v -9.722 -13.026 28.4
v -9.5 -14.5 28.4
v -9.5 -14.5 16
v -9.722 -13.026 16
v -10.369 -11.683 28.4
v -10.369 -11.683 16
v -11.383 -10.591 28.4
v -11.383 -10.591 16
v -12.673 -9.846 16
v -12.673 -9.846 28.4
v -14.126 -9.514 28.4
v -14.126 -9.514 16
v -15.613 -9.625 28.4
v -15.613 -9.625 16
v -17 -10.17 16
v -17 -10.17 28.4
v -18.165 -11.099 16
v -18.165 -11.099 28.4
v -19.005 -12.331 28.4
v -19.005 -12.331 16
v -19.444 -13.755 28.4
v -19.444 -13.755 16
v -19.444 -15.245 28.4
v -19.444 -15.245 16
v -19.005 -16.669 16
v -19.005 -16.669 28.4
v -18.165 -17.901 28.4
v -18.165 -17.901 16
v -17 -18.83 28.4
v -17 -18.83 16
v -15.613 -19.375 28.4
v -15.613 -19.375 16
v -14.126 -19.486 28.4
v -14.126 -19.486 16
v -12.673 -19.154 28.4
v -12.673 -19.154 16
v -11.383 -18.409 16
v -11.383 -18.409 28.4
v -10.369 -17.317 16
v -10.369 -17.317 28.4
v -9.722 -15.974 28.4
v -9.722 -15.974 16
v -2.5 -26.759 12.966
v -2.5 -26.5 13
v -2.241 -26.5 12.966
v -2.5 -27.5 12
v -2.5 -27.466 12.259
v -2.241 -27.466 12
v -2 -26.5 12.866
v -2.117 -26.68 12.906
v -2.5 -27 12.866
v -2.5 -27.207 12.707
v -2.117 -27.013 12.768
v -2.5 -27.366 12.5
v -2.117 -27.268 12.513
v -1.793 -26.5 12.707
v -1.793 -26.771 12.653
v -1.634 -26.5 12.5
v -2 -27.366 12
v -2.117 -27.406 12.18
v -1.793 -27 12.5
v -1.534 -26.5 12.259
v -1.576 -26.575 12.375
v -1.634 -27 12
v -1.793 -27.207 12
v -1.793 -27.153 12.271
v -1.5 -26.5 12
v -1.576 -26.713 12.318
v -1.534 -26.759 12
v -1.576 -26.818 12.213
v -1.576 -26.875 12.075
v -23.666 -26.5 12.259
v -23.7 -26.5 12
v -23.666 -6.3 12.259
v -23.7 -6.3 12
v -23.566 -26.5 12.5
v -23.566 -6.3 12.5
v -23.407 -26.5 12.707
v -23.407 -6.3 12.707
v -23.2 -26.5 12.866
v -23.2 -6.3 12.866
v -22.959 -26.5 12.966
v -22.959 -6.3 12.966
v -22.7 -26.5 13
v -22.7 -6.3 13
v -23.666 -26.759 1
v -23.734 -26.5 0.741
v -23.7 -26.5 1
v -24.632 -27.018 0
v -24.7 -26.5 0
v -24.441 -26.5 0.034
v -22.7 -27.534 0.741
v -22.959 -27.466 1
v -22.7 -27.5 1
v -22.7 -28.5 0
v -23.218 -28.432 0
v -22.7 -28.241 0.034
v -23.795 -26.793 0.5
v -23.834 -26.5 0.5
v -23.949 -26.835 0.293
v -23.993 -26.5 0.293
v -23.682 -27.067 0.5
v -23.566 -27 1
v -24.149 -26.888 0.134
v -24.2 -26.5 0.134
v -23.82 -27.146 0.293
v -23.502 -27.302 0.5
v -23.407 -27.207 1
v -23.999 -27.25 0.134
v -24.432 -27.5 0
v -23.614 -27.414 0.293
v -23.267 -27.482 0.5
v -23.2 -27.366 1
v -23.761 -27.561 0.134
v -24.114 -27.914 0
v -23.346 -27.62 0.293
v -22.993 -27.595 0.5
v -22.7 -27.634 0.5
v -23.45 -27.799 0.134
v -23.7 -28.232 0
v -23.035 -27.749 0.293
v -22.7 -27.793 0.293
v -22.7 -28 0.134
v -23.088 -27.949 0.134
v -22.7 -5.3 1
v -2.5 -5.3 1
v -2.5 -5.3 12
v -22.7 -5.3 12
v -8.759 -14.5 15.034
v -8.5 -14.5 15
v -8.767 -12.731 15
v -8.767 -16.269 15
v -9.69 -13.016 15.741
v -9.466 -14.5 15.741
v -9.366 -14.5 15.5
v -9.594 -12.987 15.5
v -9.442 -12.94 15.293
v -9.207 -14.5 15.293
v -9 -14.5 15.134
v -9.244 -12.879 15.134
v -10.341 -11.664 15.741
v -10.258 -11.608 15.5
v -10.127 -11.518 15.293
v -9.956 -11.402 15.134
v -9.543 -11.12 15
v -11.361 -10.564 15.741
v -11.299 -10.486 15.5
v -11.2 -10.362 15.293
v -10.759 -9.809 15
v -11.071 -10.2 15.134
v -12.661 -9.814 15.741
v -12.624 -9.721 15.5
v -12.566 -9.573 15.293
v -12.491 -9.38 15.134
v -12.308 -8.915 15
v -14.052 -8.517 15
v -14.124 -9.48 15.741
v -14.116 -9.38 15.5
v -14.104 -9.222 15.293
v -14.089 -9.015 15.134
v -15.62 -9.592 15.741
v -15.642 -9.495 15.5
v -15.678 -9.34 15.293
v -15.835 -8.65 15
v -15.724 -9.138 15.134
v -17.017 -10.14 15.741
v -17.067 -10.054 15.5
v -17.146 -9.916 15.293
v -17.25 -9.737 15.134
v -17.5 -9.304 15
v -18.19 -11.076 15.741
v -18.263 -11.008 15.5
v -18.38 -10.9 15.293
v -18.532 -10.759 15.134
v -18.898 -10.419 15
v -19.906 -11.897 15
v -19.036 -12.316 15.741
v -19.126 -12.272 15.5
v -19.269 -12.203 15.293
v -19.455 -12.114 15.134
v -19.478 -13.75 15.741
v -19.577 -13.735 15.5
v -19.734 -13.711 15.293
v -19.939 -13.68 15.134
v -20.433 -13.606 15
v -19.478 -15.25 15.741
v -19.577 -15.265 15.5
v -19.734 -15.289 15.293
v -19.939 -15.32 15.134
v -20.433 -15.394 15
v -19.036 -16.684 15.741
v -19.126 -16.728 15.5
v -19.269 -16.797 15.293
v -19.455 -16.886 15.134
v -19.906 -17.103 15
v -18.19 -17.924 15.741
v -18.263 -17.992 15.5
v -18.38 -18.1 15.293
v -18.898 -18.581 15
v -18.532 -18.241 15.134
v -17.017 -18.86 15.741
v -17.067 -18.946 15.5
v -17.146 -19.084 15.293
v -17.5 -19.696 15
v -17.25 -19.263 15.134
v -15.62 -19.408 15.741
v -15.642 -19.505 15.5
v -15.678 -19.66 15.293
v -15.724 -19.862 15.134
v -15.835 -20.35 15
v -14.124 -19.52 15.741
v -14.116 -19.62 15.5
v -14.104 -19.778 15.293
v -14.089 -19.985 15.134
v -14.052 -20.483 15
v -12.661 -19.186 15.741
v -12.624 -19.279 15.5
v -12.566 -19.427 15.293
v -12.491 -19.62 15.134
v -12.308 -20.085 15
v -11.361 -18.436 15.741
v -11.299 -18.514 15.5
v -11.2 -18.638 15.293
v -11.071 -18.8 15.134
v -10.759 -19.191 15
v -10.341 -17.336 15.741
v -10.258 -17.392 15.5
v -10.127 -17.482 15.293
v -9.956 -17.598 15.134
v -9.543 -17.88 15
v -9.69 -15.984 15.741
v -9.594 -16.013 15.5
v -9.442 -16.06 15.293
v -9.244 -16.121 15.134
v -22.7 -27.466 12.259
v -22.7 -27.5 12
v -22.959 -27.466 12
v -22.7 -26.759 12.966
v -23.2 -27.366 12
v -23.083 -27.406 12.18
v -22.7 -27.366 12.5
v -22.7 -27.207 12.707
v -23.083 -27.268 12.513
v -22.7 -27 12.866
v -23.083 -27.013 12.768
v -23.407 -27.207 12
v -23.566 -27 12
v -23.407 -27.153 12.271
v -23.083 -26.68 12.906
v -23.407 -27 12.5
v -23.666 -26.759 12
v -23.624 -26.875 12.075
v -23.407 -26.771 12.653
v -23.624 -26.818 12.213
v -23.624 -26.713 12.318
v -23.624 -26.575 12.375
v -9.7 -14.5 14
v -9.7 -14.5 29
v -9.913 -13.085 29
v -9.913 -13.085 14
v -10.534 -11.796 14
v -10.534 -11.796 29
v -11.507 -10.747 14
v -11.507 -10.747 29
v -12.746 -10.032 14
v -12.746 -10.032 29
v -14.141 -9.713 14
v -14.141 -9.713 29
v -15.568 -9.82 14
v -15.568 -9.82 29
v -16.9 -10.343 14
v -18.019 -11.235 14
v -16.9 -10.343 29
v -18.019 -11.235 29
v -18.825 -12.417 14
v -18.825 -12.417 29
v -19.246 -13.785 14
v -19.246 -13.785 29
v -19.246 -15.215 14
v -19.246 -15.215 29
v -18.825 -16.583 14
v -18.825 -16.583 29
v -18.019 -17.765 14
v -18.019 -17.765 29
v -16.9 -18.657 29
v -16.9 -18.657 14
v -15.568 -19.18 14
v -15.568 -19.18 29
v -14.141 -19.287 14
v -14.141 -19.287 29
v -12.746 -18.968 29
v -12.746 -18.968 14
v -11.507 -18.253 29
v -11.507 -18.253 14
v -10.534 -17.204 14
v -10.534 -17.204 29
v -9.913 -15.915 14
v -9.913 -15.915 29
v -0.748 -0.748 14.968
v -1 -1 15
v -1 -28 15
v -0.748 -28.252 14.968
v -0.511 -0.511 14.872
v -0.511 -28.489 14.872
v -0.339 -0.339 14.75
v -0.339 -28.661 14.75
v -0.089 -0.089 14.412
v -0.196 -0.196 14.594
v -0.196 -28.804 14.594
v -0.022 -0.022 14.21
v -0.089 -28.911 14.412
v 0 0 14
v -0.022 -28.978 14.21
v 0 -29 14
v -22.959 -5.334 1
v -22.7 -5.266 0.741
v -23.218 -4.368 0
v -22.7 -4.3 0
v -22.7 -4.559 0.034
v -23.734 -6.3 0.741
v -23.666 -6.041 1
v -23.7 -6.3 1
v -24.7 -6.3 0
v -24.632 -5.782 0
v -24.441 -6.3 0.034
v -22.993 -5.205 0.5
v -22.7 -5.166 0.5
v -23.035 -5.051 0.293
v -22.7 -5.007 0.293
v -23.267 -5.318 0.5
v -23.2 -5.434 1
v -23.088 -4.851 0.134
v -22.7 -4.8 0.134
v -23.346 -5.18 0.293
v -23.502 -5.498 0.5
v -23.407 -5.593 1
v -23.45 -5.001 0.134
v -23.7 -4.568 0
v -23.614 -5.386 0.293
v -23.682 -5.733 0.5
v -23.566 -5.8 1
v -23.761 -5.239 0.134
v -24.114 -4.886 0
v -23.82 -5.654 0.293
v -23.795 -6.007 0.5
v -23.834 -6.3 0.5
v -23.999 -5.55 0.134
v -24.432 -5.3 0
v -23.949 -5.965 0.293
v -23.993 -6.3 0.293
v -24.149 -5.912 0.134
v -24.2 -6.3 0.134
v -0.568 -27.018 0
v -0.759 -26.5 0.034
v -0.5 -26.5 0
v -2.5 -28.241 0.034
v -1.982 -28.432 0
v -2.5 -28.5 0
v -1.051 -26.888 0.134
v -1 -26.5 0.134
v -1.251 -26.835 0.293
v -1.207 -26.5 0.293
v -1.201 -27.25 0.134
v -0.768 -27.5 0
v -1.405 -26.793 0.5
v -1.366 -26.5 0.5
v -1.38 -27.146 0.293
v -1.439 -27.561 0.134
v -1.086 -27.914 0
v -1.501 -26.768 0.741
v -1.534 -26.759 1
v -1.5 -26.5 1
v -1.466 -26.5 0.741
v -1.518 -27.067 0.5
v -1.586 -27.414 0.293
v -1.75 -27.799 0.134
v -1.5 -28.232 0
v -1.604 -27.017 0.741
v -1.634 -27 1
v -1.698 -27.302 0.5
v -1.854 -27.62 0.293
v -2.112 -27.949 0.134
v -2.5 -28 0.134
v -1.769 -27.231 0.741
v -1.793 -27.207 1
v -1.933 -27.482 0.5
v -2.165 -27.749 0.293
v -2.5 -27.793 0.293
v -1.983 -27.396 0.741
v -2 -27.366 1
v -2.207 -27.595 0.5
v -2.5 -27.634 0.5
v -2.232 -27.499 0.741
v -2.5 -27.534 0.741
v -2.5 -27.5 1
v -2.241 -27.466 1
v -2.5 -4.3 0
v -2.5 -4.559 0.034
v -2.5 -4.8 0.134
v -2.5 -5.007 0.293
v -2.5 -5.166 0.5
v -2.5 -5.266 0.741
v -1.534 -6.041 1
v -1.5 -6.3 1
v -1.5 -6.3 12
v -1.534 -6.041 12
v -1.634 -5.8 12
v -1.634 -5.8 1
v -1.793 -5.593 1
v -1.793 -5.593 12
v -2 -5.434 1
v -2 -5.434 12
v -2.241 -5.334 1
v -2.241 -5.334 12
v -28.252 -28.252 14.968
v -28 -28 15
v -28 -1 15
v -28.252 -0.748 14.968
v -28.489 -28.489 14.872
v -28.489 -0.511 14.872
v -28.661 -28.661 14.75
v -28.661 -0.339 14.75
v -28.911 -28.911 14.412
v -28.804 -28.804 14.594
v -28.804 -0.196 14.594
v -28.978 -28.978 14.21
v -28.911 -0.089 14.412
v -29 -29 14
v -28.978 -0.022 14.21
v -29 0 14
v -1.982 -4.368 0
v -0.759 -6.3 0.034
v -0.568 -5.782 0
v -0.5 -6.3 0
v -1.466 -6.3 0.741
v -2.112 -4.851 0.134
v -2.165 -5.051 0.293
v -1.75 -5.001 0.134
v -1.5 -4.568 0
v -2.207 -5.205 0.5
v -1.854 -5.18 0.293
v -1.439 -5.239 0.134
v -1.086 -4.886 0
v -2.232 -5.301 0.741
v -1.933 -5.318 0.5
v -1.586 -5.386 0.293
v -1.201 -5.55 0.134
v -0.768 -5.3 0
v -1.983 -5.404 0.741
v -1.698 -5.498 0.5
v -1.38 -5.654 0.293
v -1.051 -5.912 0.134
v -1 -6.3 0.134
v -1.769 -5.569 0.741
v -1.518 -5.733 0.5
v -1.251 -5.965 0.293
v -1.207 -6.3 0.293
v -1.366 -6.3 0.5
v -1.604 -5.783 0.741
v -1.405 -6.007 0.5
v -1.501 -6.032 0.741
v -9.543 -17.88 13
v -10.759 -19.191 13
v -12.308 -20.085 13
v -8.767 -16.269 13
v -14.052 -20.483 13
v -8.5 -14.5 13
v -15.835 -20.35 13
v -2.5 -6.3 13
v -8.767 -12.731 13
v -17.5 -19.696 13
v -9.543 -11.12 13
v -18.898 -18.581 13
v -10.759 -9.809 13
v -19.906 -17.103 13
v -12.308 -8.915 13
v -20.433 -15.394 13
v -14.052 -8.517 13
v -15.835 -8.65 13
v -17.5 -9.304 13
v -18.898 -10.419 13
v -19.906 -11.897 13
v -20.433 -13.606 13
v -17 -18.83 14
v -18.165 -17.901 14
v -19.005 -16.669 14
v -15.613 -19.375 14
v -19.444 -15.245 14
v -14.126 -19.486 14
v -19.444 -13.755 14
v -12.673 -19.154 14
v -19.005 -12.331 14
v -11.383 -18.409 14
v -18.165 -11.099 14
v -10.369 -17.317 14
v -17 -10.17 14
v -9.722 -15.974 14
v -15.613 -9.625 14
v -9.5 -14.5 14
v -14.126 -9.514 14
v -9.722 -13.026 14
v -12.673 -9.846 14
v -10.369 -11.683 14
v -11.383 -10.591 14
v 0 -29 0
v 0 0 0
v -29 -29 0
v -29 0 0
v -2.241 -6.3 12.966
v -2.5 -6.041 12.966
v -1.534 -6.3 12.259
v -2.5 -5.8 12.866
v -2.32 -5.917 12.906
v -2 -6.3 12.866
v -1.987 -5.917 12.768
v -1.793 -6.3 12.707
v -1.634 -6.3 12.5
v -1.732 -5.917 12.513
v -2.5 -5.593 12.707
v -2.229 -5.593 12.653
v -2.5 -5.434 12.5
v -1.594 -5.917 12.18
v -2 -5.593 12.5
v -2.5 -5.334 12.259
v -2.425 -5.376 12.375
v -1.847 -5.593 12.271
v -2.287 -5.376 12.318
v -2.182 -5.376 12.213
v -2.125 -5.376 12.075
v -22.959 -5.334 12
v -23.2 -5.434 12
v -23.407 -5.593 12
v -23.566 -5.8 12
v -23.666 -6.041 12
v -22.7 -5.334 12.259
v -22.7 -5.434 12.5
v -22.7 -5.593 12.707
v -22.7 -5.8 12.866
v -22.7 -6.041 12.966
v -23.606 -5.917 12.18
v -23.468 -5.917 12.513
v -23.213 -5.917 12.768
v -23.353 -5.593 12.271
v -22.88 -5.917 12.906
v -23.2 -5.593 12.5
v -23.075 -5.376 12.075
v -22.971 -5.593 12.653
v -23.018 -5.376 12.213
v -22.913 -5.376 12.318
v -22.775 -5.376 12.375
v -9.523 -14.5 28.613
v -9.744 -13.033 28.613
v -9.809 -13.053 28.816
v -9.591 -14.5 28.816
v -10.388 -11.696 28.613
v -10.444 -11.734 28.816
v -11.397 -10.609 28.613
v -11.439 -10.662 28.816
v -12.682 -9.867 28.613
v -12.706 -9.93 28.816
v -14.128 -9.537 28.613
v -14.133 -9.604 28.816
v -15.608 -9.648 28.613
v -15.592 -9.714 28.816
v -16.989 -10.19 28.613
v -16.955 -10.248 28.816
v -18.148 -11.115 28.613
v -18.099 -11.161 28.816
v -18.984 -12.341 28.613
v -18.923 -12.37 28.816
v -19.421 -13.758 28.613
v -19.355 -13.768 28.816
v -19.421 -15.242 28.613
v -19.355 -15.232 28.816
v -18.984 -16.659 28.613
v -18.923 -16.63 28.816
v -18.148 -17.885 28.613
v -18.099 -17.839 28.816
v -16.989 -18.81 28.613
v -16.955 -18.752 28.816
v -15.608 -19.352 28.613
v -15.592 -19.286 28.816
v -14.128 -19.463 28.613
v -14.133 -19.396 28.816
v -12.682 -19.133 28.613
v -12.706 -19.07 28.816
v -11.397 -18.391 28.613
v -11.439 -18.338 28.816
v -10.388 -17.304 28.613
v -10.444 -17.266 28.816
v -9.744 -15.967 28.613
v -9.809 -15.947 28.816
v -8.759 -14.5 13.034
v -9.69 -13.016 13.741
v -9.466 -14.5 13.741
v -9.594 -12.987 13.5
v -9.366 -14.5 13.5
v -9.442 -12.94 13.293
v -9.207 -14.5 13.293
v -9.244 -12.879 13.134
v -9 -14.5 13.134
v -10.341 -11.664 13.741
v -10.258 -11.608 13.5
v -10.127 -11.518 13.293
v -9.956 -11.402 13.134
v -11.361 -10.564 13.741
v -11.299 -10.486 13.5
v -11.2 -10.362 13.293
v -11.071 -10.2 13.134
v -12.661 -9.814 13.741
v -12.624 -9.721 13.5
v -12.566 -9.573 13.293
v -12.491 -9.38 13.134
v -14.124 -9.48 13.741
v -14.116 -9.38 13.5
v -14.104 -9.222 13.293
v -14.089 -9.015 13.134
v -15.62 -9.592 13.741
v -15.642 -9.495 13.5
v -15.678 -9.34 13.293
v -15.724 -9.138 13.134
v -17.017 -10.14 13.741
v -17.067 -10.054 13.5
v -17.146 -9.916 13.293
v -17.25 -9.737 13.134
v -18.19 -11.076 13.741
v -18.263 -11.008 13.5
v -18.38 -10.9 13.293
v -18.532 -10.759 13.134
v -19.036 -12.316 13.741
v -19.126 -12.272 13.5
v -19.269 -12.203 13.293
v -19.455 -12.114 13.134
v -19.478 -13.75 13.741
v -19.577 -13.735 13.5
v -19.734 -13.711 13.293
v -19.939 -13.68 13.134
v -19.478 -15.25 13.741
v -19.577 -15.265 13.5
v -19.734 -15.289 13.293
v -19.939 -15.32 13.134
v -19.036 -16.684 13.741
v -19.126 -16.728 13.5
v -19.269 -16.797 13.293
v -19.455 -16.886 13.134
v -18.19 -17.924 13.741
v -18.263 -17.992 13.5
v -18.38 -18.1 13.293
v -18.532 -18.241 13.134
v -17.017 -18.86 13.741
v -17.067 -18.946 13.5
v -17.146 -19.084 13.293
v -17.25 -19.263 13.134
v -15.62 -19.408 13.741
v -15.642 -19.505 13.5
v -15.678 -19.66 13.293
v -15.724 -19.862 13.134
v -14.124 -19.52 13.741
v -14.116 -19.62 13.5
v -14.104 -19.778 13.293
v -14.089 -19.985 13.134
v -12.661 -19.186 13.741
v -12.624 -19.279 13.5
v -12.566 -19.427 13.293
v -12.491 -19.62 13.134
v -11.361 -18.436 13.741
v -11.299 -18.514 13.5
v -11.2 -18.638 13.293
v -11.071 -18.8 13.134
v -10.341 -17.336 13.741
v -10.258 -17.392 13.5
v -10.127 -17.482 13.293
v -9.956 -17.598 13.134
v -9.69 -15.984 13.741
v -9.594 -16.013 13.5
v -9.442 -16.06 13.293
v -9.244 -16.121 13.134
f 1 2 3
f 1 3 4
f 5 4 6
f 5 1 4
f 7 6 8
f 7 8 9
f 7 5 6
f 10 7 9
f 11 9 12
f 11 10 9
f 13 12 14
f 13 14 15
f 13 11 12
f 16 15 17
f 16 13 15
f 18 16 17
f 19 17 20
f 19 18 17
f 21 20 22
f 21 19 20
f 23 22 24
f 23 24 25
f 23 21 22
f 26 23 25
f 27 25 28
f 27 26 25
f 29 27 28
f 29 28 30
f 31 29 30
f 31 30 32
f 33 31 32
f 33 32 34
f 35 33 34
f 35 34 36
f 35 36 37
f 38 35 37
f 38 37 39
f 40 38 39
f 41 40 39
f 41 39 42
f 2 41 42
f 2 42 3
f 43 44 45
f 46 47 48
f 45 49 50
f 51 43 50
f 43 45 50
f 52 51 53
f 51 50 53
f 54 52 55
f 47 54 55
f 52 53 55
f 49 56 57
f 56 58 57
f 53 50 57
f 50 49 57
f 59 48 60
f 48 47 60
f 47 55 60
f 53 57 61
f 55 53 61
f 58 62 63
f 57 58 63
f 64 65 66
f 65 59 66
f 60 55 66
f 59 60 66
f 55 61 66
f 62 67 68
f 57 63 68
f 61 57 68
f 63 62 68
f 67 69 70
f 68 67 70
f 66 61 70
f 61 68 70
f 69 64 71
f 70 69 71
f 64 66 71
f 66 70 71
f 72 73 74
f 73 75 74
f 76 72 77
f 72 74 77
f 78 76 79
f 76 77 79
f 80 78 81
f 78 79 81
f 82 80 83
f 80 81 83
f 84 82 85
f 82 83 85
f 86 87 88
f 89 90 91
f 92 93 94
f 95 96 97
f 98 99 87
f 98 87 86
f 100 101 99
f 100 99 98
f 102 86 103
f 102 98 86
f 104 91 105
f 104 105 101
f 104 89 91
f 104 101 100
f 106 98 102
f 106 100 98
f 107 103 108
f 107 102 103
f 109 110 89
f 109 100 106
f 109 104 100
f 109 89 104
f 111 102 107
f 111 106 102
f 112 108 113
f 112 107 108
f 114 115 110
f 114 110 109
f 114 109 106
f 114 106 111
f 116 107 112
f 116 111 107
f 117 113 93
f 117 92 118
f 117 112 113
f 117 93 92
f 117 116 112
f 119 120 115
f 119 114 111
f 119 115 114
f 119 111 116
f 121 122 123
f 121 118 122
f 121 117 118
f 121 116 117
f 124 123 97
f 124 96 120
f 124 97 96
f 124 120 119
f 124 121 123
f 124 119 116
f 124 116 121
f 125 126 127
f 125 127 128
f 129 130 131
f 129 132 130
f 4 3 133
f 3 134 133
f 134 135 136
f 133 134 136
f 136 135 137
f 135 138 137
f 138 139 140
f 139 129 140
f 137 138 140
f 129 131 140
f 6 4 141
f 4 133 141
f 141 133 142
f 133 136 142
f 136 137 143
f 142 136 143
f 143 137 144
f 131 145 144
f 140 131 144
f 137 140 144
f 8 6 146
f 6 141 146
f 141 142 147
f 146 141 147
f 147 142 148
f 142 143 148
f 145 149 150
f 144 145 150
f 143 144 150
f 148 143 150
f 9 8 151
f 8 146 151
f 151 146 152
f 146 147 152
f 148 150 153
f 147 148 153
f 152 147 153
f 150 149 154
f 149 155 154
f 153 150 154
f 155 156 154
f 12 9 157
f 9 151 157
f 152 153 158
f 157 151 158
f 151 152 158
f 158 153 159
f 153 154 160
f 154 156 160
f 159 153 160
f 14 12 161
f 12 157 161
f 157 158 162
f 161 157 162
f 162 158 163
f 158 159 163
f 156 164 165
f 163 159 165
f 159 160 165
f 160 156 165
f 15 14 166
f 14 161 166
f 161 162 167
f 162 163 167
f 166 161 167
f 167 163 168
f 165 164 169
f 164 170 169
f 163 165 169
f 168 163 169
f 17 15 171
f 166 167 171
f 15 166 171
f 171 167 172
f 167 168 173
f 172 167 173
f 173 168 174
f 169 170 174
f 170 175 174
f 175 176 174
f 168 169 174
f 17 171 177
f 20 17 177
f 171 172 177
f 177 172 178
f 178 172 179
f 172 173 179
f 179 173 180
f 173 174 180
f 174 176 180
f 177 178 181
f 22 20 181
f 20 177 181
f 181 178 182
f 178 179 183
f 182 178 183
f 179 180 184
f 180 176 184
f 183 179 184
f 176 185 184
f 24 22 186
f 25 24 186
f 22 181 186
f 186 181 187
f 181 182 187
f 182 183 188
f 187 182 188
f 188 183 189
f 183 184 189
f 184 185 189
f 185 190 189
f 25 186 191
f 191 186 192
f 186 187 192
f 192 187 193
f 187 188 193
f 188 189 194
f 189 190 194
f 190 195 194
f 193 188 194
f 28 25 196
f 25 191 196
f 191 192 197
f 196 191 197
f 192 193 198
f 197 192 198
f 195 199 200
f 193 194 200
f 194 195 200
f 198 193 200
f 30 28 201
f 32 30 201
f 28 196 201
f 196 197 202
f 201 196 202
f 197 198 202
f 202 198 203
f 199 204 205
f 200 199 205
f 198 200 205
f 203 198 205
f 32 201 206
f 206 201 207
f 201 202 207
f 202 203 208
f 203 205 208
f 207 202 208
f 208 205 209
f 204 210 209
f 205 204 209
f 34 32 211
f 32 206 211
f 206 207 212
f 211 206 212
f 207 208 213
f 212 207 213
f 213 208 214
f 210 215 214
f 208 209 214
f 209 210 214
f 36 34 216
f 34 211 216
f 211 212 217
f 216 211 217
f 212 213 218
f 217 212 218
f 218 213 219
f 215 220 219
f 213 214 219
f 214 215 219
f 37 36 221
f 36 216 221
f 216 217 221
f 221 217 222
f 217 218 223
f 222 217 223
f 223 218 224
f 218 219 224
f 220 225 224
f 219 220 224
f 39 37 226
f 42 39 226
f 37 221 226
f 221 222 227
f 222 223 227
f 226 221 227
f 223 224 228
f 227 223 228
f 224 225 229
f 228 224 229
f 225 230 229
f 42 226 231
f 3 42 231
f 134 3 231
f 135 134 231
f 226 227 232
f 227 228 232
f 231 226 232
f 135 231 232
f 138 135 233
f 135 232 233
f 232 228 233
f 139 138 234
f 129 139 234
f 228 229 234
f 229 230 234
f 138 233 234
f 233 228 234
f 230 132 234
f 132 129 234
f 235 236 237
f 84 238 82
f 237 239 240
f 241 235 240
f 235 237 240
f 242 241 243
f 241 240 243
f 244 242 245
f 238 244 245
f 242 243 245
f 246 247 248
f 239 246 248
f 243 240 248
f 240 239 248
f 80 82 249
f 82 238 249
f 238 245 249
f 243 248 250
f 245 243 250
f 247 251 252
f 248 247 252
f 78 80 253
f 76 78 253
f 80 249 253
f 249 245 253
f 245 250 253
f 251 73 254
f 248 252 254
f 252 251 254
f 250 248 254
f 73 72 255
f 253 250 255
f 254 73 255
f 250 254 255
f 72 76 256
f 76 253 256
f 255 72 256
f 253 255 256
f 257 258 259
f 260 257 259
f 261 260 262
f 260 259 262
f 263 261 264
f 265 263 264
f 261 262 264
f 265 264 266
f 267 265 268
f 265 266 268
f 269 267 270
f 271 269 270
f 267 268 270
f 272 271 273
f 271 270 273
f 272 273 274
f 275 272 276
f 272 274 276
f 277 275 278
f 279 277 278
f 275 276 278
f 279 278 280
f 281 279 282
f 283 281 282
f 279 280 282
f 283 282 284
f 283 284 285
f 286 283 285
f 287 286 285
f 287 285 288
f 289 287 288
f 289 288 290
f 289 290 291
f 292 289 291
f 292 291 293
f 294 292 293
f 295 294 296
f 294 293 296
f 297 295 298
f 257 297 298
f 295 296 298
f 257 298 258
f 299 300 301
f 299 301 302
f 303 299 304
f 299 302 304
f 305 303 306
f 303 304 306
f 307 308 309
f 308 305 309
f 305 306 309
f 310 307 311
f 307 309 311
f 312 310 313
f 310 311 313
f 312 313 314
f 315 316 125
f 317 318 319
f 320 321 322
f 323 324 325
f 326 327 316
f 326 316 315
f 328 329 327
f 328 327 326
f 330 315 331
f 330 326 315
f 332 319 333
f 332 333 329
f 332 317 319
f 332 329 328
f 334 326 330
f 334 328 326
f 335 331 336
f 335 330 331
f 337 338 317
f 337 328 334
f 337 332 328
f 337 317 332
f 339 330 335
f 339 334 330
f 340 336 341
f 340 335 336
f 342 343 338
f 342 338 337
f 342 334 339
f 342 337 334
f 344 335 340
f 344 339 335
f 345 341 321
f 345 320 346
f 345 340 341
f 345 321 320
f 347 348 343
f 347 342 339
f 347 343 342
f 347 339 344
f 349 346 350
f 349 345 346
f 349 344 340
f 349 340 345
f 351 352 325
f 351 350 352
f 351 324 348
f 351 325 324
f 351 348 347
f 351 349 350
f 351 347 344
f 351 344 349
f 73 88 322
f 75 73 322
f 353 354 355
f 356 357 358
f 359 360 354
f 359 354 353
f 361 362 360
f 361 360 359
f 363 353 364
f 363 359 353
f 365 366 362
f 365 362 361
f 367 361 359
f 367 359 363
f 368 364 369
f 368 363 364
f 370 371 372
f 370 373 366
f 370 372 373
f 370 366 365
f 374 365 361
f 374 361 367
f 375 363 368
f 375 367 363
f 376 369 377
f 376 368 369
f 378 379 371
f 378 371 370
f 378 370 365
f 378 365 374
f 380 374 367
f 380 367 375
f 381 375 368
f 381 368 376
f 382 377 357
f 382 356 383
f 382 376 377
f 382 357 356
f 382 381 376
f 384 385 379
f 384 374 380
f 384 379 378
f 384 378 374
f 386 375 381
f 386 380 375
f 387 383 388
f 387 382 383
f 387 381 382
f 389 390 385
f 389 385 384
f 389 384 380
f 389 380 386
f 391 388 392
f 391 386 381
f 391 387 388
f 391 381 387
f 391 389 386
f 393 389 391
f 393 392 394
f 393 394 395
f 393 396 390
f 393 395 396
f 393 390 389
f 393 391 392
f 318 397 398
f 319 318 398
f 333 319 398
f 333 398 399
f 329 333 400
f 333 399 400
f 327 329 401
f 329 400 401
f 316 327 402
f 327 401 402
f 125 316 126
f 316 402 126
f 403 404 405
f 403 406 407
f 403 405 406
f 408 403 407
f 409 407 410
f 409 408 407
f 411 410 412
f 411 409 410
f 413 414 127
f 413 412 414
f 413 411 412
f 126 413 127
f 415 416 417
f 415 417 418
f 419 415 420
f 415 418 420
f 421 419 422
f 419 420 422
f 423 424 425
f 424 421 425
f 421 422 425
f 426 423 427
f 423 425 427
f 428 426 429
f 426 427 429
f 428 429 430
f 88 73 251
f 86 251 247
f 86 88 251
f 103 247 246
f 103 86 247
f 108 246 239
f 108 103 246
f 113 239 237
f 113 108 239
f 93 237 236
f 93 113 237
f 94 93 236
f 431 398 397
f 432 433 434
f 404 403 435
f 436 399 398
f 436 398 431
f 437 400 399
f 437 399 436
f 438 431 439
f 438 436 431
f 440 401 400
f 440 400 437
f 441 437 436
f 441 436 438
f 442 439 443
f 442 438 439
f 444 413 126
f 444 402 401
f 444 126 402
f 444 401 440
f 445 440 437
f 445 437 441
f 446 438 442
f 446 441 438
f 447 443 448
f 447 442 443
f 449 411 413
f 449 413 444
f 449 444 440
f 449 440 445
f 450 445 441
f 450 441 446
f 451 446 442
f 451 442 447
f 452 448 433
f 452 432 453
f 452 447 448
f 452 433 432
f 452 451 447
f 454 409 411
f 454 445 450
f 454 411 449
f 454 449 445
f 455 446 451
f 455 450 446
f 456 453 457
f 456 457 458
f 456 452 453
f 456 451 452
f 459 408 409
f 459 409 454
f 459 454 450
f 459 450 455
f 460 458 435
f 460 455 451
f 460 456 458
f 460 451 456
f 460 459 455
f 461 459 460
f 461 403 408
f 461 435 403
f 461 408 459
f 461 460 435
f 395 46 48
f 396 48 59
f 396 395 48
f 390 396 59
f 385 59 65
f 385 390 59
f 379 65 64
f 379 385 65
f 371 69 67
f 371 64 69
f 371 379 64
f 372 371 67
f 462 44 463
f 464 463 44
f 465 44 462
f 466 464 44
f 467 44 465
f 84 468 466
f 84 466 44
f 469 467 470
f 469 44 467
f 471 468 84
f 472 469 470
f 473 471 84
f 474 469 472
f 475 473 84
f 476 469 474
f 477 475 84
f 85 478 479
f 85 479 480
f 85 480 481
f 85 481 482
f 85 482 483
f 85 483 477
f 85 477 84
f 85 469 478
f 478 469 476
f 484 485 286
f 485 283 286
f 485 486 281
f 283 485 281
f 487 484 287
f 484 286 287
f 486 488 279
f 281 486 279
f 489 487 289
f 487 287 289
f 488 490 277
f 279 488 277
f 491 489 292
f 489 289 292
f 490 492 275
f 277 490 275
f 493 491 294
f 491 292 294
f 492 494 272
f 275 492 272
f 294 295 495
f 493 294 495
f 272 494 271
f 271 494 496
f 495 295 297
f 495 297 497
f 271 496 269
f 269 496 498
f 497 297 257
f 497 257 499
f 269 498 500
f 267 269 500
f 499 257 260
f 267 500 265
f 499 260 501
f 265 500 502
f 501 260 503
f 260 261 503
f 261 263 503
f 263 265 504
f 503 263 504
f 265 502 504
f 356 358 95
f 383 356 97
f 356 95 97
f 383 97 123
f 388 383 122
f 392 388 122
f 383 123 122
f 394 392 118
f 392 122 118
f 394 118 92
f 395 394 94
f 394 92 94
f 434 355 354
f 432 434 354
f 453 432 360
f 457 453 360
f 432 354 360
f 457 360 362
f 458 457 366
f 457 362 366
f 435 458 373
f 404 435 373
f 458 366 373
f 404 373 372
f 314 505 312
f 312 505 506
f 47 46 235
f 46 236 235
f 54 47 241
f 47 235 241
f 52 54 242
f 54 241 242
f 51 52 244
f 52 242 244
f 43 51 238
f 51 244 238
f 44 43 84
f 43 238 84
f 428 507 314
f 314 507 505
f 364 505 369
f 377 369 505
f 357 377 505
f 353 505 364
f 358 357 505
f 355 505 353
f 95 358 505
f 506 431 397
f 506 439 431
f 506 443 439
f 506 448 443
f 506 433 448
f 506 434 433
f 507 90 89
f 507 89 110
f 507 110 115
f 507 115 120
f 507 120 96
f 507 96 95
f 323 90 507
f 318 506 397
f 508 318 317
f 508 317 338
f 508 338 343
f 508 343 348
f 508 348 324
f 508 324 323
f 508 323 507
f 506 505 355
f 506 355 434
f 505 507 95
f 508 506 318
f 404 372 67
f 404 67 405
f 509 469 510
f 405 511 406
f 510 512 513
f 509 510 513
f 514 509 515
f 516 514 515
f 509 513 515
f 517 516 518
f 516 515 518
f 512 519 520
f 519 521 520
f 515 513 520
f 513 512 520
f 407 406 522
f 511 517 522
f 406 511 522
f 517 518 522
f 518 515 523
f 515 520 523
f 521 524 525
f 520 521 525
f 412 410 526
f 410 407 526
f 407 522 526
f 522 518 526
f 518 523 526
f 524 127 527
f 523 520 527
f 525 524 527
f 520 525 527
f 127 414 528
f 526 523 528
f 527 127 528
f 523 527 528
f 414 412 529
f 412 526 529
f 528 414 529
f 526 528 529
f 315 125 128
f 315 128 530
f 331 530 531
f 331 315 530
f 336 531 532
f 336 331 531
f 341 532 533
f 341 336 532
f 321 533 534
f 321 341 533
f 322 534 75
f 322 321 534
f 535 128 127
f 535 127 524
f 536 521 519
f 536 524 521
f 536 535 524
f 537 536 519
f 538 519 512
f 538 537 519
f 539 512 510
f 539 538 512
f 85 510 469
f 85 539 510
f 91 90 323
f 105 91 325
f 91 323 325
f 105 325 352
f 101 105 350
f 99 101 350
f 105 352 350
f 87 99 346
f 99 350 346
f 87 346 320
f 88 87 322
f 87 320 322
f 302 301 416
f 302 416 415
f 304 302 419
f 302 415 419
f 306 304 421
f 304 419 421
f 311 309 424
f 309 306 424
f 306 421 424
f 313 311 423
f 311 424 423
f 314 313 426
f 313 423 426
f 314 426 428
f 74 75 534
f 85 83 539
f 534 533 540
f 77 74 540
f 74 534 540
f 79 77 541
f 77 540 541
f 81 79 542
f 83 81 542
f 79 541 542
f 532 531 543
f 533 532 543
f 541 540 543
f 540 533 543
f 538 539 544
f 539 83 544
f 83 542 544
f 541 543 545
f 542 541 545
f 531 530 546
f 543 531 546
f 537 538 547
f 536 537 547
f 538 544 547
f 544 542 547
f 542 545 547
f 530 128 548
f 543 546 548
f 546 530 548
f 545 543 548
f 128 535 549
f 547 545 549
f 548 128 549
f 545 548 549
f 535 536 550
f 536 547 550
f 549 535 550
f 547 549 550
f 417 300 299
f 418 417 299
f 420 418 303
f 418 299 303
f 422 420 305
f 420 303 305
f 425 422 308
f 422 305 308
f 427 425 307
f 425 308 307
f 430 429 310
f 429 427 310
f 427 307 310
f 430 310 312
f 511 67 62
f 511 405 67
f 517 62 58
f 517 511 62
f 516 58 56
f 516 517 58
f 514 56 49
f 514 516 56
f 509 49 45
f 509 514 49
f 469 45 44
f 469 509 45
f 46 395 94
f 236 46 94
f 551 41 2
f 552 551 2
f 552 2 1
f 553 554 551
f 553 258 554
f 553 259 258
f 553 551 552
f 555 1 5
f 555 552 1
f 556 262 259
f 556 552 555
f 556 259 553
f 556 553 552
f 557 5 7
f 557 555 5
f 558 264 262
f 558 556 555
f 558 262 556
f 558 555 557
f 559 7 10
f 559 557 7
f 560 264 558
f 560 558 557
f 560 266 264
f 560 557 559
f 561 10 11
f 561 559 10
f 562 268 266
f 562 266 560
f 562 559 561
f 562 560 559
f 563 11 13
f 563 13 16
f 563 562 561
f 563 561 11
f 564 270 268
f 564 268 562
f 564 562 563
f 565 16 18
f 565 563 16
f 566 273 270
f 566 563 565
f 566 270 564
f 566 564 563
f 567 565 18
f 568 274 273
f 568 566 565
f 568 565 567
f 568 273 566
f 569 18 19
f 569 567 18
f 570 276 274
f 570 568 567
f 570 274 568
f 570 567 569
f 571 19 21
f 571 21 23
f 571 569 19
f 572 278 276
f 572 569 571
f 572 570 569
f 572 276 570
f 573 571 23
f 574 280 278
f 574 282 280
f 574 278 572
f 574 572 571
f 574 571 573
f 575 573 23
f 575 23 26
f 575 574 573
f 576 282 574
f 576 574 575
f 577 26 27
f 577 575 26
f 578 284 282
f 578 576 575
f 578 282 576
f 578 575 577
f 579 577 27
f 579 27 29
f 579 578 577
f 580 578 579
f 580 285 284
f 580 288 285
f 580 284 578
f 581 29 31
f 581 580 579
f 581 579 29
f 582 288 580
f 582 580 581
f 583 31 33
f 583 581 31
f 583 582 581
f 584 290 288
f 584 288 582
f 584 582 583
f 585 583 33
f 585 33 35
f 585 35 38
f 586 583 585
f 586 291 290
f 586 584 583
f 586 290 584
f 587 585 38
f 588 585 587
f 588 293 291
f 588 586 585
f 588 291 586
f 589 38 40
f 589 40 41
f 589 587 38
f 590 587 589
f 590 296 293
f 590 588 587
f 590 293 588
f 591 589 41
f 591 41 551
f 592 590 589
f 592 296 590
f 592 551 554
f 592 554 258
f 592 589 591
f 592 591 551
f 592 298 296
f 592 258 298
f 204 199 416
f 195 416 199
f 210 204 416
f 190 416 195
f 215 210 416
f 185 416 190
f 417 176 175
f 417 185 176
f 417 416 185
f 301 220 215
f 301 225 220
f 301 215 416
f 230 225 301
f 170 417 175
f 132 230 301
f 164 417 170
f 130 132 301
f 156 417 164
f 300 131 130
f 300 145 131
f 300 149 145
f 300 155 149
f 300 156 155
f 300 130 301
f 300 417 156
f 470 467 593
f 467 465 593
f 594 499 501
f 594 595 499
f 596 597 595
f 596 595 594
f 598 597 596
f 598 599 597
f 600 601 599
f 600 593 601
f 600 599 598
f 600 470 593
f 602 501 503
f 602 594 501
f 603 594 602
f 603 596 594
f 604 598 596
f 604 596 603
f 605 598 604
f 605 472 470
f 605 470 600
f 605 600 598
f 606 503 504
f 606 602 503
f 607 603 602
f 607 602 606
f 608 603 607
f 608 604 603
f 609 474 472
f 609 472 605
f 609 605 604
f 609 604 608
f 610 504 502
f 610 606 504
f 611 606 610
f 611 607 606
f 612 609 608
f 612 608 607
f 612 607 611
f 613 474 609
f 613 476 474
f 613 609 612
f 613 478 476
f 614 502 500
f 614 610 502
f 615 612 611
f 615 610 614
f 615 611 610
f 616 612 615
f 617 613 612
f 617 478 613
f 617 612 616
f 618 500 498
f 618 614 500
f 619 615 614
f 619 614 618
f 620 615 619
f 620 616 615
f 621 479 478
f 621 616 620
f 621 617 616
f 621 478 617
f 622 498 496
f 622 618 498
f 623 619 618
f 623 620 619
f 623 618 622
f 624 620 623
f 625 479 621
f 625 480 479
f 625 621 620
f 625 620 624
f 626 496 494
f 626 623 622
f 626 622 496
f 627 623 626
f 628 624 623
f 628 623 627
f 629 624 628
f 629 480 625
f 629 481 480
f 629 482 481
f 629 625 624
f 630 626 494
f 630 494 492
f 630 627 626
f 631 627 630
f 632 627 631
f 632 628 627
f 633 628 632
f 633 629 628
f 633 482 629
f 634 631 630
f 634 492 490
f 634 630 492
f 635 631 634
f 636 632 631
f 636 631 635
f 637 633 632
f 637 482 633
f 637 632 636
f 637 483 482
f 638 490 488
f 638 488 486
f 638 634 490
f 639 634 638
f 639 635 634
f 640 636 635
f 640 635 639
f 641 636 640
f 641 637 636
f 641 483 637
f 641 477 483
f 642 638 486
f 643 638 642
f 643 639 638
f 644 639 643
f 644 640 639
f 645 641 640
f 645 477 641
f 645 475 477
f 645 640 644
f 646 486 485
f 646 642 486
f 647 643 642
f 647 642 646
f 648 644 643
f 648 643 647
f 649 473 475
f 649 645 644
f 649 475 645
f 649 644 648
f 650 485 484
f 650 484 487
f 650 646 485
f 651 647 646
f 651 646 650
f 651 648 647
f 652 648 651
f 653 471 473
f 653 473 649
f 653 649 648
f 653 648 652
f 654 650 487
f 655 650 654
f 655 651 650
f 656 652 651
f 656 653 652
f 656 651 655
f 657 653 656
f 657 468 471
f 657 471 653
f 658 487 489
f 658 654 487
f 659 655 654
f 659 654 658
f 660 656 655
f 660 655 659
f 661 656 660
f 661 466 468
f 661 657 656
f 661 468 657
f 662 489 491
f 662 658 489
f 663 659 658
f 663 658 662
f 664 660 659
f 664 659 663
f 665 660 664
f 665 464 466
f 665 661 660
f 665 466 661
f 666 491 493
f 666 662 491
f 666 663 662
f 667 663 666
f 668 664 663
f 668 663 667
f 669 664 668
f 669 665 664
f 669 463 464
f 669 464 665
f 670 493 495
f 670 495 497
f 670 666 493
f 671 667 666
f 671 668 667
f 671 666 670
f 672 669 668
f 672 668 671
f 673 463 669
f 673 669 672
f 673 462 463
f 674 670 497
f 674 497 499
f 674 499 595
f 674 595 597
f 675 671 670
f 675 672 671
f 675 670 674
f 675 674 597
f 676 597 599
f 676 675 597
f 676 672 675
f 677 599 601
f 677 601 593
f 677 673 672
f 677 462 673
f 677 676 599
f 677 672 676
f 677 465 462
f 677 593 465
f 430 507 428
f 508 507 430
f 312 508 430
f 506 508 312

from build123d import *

# Parameters (mm, degrees)
SKETCH1_W           = 29
SKETCH1_H           = 29
BOSS_EXTRUDE1_DEPTH = 15
SKETCH2_R           = 5
CUT_EXTRUDE1_DEPTH  = 44.669211122
SKETCH3_W           = 22.2
SKETCH3_H           = 22.2
CUT_EXTRUDE2_DEPTH  = 13
FILLET2_R           = 1
FILLET3_R           = 1
BOSS_EXTRUDE3_START = 15
SKETCH7_R           = 5
BOSS_EXTRUDE3_DEPTH = 15
SKETCH8_R           = 4.8
CUT_EXTRUDE4_DEPTH  = 15
FILLET4_R           = 1


with BuildPart() as part:
    # Sketch1 → Boss-Extrude1 (new body)
    with BuildSketch(Plane.XY):
        with Locations((-14.5, -14.5)):
            Rectangle(SKETCH1_W, SKETCH1_H)
    extrude(amount=BOSS_EXTRUDE1_DEPTH)

    # Sketch2 → Cut-Extrude1 (cut, through all)
    with BuildSketch(Plane.XY.offset(15)):
        with Locations((-14.5, -14.5)):
            Circle(SKETCH2_R)
    extrude(amount=-CUT_EXTRUDE1_DEPTH, mode=Mode.SUBTRACT)

    # Sketch3 → Cut-Extrude2 (cut)
    with BuildSketch(Plane(origin=(0, 0, 0), x_dir=(-1, 0, 0), z_dir=(0, 0, -1))):
        with Locations((12.6, -16.4)):
            Rectangle(SKETCH3_W, SKETCH3_H)
    extrude(amount=-CUT_EXTRUDE2_DEPTH, mode=Mode.SUBTRACT)

    # Fillet2
    fillet2_edges = [part.edges().sort_by_distance(p)[0] for p in [
        (-1.5, -16.4, 13),
        (-12.6, -5.3, 13),
        (-23.7, -16.4, 13),
        (-12.6, -27.5, 13),
        (-19.5, -14.5, 13),
    ]]
    fillet(fillet2_edges, radius=FILLET2_R)

    # Fillet3
    # the kernel refuses this fillet: 1 mm, written as the material it adds along each edge
    with BuildSketch(Plane(origin=(-22.7, -26.5, 12), x_dir=(0, -1, 0), z_dir=(-1, 0, 0))) as fillet3_piece_1_section:
        Polygon((0, 0), (FILLET3_R, 0), (FILLET3_R, FILLET3_R), (0, FILLET3_R), align=None)
    fillet3_piece_1 = extrude(amount=FILLET3_R, mode=Mode.PRIVATE)
    fillet3_piece_1 = fillet3_piece_1 - Plane(origin=(-22.7, -26.5, 12), x_dir=(0, 0.7071067811865475, -0.7071067811865475), z_dir=(-1, 0, 0)) * Sphere(FILLET3_R, mode=Mode.PRIVATE)
    add(fillet3_piece_1)
    with BuildSketch(Plane(origin=(-2.5, -26.5, 12), x_dir=(0, -1, 0), z_dir=(1, 0, 0))) as fillet3_piece_2_section:
        Polygon((0, 0), (FILLET3_R, 0), (FILLET3_R, -FILLET3_R), (0, -FILLET3_R), align=None)
    fillet3_piece_2 = extrude(amount=FILLET3_R, mode=Mode.PRIVATE)
    fillet3_piece_2 = fillet3_piece_2 - Plane(origin=(-2.5, -26.5, 12), x_dir=(0, 0.7071067811865475, -0.7071067811865475), z_dir=(1, 0, 0)) * Sphere(FILLET3_R, mode=Mode.PRIVATE)
    add(fillet3_piece_2)
    with BuildSketch(Plane(origin=(-22.7, -6.3, 12), x_dir=(-1, 0, 0), z_dir=(0, 1, 0))) as fillet3_piece_3_section:
        Polygon((0, 0), (FILLET3_R, 0), (FILLET3_R, FILLET3_R), (0, FILLET3_R), align=None)
    fillet3_piece_3 = extrude(amount=FILLET3_R, mode=Mode.PRIVATE)
    fillet3_piece_3 = fillet3_piece_3 - Plane(origin=(-22.7, -6.3, 12), x_dir=(0.7071067811865475, 0, -0.7071067811865475), z_dir=(0, 1, 0)) * Sphere(FILLET3_R, mode=Mode.PRIVATE)
    add(fillet3_piece_3)
    with BuildSketch(Plane(origin=(-2.5, -6.3, 12), x_dir=(1, 0, 0), z_dir=(0, 1, 0))) as fillet3_piece_4_section:
        Polygon((0, 0), (FILLET3_R, 0), (FILLET3_R, -FILLET3_R), (0, -FILLET3_R), align=None)
    fillet3_piece_4 = extrude(amount=FILLET3_R, mode=Mode.PRIVATE)
    fillet3_piece_4 = fillet3_piece_4 - Plane(origin=(-2.5, -6.3, 12), x_dir=(-0.7071067811865475, 0, -0.7071067811865475), z_dir=(0, 1, 0)) * Sphere(FILLET3_R, mode=Mode.PRIVATE)
    add(fillet3_piece_4)
    with BuildSketch(Plane(origin=(-1.5, -5.3, 0), x_dir=(-1, 0, 0), z_dir=(0, 0, 1)), Plane(origin=(-1.5, -27.5, 0), x_dir=(0, 1, 0), z_dir=(0, 0, 1))) as fillet3_piece_5:
        with BuildLine():
            CenterArc((FILLET3_R, FILLET3_R), FILLET3_R, 180, 90)
            Line((0, FILLET3_R), (0, 0))
            Line((0, 0), (FILLET3_R, 0))
        make_face()
    extrude(amount=12)
    with BuildSketch(Plane(origin=(-23.7, -5.3, 0), x_dir=(1, 0, 0), z_dir=(0, 0, 1)), Plane(origin=(-23.7, -27.5, 0), x_dir=(0, 1, 0), z_dir=(0, 0, 1))) as fillet3_piece_6:
        with BuildLine():
            CenterArc((FILLET3_R, -FILLET3_R), FILLET3_R, 90, 90)
            Line((0, -FILLET3_R), (0, 0))
            Line((0, 0), (FILLET3_R, 0))
        make_face()
    extrude(amount=12)
    # the kernel refuses this fillet: 1 mm, written as the material it takes off along each edge
    with BuildSketch(Plane(origin=(-1.5, -26.5, 0), x_dir=(1, 0, 0), z_dir=(0, 1, 0)), Plane(origin=(-22.7, -27.5, 0), x_dir=(0, -1, 0), z_dir=(1, 0, 0)), Plane(origin=(-23.7, -6.3, 0), x_dir=(-1, 0, 0), z_dir=(0, -1, 0)), Plane(origin=(-2.5, -5.3, 0), x_dir=(0, 1, 0), z_dir=(-1, 0, 0))) as fillet3_2_piece_1:
        with BuildLine():
            CenterArc((FILLET3_R, -FILLET3_R), FILLET3_R, 90, 90)
            Line((0, -FILLET3_R), (0, 0))
            Line((0, 0), (FILLET3_R, 0))
        make_face()
    extrude(amount=20.2, mode=Mode.SUBTRACT)
    with BuildSketch(Plane(origin=(-2.5, -6.3, 0), x_dir=(0, 1, 0), z_dir=(-1, 0, 0))) as fillet3_2_piece_2:
        with BuildLine():
            CenterArc((1 + FILLET3_R, -FILLET3_R), FILLET3_R, 90, 90)
            Line((1, -FILLET3_R), (1, 0))
            Line((1, 0), (1 + FILLET3_R, 0))
        make_face()
    revolve(axis=Axis((-2.5, -6.3, 0), (0, 0, -1)), revolution_arc=90, mode=Mode.SUBTRACT)
    with BuildSketch(Plane(origin=(-22.7, -6.3, 0), x_dir=(0, 1, 0), z_dir=(1, 0, 0))) as fillet3_2_piece_3:
        with BuildLine():
            CenterArc((1 + FILLET3_R, FILLET3_R), FILLET3_R, 180, 90)
            Line((1, FILLET3_R), (1, 0))
            Line((1, 0), (1 + FILLET3_R, 0))
        make_face()
    revolve(axis=Axis((-22.7, -6.3, 0), (0, 0, 1)), revolution_arc=90, mode=Mode.SUBTRACT)
    with BuildSketch(Plane(origin=(-22.7, -26.5, 0), x_dir=(-1, 0, 0), z_dir=(0, 1, 0))) as fillet3_2_piece_4:
        with BuildLine():
            CenterArc((1 + FILLET3_R, FILLET3_R), FILLET3_R, 180, 90)
            Line((1, FILLET3_R), (1, 0))
            Line((1, 0), (1 + FILLET3_R, 0))
        make_face()
    revolve(axis=Axis((-22.7, -26.5, 0), (0, 0, 1)), revolution_arc=90, mode=Mode.SUBTRACT)
    with BuildSketch(Plane(origin=(-2.5, -26.5, 0), x_dir=(1, 0, 0), z_dir=(0, 1, 0))) as fillet3_2_piece_5:
        with BuildLine():
            CenterArc((1 + FILLET3_R, -FILLET3_R), FILLET3_R, 90, 90)
            Line((1, -FILLET3_R), (1, 0))
            Line((1, 0), (1 + FILLET3_R, 0))
        make_face()
    revolve(axis=Axis((-2.5, -26.5, 0), (0, 0, -1)), revolution_arc=90, mode=Mode.SUBTRACT)

    # Sketch7 → Boss-Extrude3 (add)
    with BuildSketch(Plane.XY.offset(14).offset(BOSS_EXTRUDE3_START)):
        with Locations((-14.5, -14.5)):
            Circle(SKETCH7_R)
    extrude(amount=-BOSS_EXTRUDE3_DEPTH)

    # Sketch8 → Cut-Extrude4 (cut)
    with BuildSketch(Plane.XY.offset(29)):
        with Locations((-14.5, -14.5)):
            Circle(SKETCH8_R)
    extrude(amount=-CUT_EXTRUDE4_DEPTH, mode=Mode.SUBTRACT)

    # Fillet4
    # the kernel refuses this fillet: 1 mm, written as the material it adds along each edge
    with BuildSketch(Plane(origin=(-14.5, -14.5, 15), x_dir=(1, 0, 0), z_dir=(0, -1, 0))) as fillet4_piece_1:
        with BuildLine():
            CenterArc((5 + FILLET4_R, FILLET4_R), FILLET4_R, 180, 90)
            Line((5, FILLET4_R), (5, 0))
            Line((5, 0), (5 + FILLET4_R, 0))
        make_face()
    revolve(axis=Axis((-14.5, -14.5, 15), (0, 0, 1)))
    # the kernel refuses this fillet: 1 mm, written as the material it takes off along each edge
    with BuildSketch(Plane(origin=(-29, 2.5, 15), x_dir=(0, 0, -1), z_dir=(0, -1, 0)), Plane(origin=(-31.5, -29, 15), x_dir=(0, 0, -1), z_dir=(1, 0, 0)), Plane(origin=(0, -31.5, 15), x_dir=(0, 0, -1), z_dir=(0, 1, 0)), Plane(origin=(2.5, 0, 15), x_dir=(0, 0, -1), z_dir=(-1, 0, 0))) as fillet4_2_piece_1:
        with BuildLine():
            CenterArc((FILLET4_R, FILLET4_R), FILLET4_R, 180, 90)
            Line((0, FILLET4_R), (0, 0))
            Line((0, 0), (FILLET4_R, 0))
        make_face()
    extrude(amount=34, mode=Mode.SUBTRACT)
    with BuildSketch(Plane(origin=(-14.5, -14.5, 29), x_dir=(1, 0, 0), z_dir=(0, -1, 0))) as fillet4_2_piece_2:
        with BuildLine():
            CenterArc((4, -0.6), FILLET4_R, 0, 36.869897646)
            Line((4.8, 0), (5, 0))
            Line((5, 0), (5, -0.6))
        make_face()
    revolve(axis=Axis((-14.5, -14.5, 29), (0, 0, 1)), mode=Mode.SUBTRACT)


solid = part.part
